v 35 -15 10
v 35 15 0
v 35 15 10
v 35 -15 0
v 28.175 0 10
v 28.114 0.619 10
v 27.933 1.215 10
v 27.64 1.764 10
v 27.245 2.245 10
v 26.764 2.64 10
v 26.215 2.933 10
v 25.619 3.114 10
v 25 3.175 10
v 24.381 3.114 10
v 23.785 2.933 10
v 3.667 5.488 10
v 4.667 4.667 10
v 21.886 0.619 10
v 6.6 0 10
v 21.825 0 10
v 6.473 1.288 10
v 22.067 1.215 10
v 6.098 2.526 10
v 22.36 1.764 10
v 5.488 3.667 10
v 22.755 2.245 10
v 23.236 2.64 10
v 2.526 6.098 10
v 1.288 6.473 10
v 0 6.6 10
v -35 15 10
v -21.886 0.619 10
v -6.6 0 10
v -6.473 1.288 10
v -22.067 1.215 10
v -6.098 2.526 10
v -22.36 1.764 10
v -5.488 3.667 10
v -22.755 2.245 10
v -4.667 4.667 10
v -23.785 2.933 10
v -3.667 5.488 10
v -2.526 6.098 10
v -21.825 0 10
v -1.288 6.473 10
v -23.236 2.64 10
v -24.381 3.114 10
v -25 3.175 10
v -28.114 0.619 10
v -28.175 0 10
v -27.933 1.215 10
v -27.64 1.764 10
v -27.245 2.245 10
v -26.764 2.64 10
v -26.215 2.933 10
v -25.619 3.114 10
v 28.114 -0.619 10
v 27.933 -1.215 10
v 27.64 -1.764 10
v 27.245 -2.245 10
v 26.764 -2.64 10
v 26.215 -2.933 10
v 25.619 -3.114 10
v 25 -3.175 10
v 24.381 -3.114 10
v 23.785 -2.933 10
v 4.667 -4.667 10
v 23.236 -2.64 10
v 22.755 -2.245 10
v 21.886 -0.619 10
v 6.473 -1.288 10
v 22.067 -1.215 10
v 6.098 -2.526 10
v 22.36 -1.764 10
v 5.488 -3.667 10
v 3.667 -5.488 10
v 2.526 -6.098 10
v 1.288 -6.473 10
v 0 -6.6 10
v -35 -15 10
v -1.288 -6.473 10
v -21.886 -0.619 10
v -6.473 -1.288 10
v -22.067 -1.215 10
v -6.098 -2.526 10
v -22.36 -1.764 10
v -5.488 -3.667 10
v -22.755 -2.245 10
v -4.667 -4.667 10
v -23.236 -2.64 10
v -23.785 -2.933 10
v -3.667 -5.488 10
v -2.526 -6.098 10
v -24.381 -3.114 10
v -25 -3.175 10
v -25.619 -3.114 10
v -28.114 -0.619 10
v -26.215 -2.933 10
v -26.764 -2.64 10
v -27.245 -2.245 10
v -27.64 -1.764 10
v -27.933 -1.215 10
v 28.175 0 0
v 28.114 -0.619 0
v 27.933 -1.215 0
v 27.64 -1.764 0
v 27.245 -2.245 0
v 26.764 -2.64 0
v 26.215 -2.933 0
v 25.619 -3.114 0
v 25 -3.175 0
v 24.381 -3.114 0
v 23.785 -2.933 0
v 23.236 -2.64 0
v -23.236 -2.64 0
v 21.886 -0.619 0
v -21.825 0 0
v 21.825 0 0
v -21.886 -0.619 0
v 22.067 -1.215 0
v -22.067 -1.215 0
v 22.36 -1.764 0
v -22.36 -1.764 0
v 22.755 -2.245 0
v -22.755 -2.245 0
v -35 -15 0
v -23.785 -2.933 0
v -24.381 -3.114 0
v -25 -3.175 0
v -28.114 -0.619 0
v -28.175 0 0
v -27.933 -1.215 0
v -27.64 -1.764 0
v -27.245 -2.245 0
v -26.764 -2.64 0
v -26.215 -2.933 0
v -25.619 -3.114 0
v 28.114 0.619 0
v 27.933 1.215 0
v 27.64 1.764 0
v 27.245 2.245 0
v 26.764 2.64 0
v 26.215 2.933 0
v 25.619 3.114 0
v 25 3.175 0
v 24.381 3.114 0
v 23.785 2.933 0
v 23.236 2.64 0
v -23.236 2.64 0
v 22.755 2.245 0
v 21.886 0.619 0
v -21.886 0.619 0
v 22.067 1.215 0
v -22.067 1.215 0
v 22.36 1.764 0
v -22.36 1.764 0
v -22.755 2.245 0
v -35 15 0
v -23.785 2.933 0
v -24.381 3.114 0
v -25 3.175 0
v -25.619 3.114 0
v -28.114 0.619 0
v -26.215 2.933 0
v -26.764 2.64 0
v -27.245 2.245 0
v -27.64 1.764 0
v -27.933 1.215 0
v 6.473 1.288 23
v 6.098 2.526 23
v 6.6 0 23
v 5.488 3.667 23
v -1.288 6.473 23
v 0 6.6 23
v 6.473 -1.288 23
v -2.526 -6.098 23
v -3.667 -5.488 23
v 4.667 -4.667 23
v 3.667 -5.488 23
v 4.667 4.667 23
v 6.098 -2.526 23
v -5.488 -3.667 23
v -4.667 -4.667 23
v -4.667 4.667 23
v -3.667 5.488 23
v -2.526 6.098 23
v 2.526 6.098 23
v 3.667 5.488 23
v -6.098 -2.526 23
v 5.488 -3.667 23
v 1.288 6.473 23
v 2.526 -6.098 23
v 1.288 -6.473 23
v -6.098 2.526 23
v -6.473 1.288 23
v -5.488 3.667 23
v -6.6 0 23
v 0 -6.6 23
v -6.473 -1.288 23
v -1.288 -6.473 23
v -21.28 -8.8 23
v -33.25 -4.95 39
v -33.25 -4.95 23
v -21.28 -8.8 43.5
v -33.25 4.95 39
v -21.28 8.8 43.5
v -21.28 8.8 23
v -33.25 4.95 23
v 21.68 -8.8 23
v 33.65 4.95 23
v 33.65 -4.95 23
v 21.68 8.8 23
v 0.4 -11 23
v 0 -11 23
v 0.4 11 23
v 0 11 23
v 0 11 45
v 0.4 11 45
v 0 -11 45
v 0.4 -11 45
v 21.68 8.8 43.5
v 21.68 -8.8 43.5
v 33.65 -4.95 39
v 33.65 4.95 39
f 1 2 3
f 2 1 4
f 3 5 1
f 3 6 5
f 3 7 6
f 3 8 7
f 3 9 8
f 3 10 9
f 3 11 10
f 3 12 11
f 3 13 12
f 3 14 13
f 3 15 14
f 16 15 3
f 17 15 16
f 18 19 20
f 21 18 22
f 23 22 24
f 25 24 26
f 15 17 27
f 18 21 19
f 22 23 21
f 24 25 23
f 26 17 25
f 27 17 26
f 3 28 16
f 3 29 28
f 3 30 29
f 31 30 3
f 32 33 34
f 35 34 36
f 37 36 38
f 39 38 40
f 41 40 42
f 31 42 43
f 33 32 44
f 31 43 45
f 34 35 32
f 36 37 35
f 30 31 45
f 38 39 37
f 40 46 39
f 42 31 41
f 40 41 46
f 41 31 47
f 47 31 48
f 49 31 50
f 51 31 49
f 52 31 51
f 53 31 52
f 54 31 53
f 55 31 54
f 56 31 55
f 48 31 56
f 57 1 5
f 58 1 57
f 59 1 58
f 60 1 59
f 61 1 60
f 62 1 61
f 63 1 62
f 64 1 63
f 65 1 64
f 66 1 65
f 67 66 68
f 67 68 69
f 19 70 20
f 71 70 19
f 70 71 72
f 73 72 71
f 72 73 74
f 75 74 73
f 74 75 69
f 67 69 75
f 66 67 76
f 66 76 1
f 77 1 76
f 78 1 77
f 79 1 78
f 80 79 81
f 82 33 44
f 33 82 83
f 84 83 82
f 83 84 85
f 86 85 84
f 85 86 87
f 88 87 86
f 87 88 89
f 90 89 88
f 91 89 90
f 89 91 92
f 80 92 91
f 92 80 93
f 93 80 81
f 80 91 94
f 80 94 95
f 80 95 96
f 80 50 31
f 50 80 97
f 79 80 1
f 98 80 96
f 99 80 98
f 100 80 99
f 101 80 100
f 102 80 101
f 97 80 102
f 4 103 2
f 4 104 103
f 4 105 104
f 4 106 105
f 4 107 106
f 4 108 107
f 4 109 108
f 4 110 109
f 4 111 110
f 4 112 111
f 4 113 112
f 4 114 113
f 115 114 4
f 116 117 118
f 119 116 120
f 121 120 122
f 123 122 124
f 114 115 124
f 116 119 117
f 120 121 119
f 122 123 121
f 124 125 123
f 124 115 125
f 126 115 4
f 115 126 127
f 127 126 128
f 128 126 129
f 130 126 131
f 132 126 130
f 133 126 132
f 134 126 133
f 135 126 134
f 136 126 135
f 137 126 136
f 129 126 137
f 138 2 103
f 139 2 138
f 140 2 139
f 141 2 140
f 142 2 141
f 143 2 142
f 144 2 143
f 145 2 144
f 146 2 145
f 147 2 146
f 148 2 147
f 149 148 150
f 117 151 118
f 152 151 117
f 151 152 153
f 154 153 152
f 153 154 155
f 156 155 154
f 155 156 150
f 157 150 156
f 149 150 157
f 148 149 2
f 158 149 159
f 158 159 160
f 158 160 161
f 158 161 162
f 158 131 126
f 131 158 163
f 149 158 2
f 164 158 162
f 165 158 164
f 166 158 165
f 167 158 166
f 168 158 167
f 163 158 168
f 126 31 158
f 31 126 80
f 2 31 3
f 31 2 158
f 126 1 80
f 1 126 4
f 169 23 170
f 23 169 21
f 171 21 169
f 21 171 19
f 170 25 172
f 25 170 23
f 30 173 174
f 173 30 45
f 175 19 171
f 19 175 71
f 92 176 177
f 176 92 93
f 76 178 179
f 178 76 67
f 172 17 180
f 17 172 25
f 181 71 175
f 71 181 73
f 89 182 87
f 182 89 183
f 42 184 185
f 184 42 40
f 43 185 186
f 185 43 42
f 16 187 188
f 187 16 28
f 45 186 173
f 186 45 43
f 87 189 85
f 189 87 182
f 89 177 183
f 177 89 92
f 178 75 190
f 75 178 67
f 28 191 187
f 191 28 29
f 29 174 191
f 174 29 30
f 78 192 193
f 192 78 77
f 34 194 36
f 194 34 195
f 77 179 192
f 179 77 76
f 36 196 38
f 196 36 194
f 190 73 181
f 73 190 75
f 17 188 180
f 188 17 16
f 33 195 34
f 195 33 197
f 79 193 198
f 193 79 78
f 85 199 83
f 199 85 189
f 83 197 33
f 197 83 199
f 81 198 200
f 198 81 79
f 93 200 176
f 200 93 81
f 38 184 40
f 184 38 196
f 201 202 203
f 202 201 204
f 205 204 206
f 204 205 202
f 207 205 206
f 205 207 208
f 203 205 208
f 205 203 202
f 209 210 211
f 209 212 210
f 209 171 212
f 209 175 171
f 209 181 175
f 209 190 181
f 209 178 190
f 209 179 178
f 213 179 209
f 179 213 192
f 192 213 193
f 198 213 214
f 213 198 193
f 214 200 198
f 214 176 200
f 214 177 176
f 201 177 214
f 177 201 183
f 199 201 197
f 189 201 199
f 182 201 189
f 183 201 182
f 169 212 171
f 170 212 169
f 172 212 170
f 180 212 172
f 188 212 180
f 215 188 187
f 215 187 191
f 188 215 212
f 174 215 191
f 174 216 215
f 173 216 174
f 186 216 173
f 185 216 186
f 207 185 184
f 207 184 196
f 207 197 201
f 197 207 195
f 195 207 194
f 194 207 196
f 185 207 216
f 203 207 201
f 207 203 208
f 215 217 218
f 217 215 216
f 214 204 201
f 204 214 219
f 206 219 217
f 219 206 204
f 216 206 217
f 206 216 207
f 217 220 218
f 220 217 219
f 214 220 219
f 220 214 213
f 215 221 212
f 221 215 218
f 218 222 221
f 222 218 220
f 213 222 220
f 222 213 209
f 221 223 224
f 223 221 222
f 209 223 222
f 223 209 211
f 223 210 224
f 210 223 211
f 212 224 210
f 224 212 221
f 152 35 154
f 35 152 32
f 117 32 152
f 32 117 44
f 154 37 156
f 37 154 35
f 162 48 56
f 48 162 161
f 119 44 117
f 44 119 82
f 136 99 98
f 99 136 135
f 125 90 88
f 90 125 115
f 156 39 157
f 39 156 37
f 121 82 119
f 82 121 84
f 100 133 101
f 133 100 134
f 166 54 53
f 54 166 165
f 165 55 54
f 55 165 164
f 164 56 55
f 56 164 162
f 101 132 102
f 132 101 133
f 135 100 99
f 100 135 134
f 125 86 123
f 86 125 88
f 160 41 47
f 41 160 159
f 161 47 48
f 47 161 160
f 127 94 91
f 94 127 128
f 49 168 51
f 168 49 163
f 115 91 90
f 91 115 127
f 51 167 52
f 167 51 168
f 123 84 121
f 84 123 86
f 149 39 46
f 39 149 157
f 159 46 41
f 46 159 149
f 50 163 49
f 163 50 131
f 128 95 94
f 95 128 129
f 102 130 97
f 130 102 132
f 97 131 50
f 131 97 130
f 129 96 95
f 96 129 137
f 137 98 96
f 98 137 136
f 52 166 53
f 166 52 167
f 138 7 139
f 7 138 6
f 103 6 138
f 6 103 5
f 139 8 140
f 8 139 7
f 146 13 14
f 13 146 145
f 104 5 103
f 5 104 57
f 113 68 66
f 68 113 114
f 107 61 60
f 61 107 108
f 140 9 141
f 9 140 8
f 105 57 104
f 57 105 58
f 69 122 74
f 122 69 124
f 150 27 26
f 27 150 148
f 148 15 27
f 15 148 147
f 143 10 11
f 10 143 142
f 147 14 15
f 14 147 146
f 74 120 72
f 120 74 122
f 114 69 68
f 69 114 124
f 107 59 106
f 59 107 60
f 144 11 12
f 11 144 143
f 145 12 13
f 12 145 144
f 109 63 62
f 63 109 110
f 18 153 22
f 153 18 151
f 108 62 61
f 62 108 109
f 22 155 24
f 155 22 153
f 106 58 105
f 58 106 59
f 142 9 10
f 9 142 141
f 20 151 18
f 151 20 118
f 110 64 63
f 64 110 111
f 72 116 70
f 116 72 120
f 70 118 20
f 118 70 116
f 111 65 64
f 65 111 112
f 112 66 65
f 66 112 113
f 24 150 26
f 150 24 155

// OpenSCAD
$fn = 32;

// ----------------------------------------------------------------------
// Boat cleat: 70 mm base, horn 34 mm up
// ----------------------------------------------------------------------

// --- parameters (mm) ---
base_l = 70;              // base length
base_w = 30;              // base width
base_t = 10;              // base thickness
horn_len = 66.5;          // horn length
horn_d = 22;              // horn diameter at the middle
horn_z = 34;              // horn axis height
end_drop = 6;             // how far the horn tips drop
post_d = 13.2;            // centre post diameter
holes_d = 6.35;           // fixing holes
hole_x = 25;              // fixing hole spacing

difference() {
  union() {
    translate([-35, -15, 0]) cube([base_l, base_w, base_t]);
    /* centre post, sunk 1 mm into the base */
    translate([0, 0, 9]) cylinder(h = 25, d = post_d);
    /* horn: a hull chain of boxes, full in the middle and lighter at the tips */
    hull() {
      translate([-33.25, -4.95, 23]) cube([0.4, 9.9, 16], center = false);
      translate([-21.28, -8.8, 23]) cube([0.4, 17.6, 20.5], center = false);
    }
    hull() {
      translate([-21.28, -8.8, 23]) cube([0.4, 17.6, 20.5], center = false);
      translate([0, -11, 23]) cube([0.4, 22, 22], center = false);
    }
    hull() {
      translate([0, -11, 23]) cube([0.4, 22, 22], center = false);
      translate([21.28, -8.8, 23]) cube([0.4, 17.6, 20.5], center = false);
    }
    hull() {
      translate([21.28, -8.8, 23]) cube([0.4, 17.6, 20.5], center = false);
      translate([33.25, -4.95, 23]) cube([0.4, 9.9, 16], center = false);
    }
  }
  translate([-25, 0, -2.5]) cylinder(h = base_t + 5, d = holes_d);
  translate([25, 0, -2.5]) cylinder(h = base_t + 5, d = holes_d);
}
